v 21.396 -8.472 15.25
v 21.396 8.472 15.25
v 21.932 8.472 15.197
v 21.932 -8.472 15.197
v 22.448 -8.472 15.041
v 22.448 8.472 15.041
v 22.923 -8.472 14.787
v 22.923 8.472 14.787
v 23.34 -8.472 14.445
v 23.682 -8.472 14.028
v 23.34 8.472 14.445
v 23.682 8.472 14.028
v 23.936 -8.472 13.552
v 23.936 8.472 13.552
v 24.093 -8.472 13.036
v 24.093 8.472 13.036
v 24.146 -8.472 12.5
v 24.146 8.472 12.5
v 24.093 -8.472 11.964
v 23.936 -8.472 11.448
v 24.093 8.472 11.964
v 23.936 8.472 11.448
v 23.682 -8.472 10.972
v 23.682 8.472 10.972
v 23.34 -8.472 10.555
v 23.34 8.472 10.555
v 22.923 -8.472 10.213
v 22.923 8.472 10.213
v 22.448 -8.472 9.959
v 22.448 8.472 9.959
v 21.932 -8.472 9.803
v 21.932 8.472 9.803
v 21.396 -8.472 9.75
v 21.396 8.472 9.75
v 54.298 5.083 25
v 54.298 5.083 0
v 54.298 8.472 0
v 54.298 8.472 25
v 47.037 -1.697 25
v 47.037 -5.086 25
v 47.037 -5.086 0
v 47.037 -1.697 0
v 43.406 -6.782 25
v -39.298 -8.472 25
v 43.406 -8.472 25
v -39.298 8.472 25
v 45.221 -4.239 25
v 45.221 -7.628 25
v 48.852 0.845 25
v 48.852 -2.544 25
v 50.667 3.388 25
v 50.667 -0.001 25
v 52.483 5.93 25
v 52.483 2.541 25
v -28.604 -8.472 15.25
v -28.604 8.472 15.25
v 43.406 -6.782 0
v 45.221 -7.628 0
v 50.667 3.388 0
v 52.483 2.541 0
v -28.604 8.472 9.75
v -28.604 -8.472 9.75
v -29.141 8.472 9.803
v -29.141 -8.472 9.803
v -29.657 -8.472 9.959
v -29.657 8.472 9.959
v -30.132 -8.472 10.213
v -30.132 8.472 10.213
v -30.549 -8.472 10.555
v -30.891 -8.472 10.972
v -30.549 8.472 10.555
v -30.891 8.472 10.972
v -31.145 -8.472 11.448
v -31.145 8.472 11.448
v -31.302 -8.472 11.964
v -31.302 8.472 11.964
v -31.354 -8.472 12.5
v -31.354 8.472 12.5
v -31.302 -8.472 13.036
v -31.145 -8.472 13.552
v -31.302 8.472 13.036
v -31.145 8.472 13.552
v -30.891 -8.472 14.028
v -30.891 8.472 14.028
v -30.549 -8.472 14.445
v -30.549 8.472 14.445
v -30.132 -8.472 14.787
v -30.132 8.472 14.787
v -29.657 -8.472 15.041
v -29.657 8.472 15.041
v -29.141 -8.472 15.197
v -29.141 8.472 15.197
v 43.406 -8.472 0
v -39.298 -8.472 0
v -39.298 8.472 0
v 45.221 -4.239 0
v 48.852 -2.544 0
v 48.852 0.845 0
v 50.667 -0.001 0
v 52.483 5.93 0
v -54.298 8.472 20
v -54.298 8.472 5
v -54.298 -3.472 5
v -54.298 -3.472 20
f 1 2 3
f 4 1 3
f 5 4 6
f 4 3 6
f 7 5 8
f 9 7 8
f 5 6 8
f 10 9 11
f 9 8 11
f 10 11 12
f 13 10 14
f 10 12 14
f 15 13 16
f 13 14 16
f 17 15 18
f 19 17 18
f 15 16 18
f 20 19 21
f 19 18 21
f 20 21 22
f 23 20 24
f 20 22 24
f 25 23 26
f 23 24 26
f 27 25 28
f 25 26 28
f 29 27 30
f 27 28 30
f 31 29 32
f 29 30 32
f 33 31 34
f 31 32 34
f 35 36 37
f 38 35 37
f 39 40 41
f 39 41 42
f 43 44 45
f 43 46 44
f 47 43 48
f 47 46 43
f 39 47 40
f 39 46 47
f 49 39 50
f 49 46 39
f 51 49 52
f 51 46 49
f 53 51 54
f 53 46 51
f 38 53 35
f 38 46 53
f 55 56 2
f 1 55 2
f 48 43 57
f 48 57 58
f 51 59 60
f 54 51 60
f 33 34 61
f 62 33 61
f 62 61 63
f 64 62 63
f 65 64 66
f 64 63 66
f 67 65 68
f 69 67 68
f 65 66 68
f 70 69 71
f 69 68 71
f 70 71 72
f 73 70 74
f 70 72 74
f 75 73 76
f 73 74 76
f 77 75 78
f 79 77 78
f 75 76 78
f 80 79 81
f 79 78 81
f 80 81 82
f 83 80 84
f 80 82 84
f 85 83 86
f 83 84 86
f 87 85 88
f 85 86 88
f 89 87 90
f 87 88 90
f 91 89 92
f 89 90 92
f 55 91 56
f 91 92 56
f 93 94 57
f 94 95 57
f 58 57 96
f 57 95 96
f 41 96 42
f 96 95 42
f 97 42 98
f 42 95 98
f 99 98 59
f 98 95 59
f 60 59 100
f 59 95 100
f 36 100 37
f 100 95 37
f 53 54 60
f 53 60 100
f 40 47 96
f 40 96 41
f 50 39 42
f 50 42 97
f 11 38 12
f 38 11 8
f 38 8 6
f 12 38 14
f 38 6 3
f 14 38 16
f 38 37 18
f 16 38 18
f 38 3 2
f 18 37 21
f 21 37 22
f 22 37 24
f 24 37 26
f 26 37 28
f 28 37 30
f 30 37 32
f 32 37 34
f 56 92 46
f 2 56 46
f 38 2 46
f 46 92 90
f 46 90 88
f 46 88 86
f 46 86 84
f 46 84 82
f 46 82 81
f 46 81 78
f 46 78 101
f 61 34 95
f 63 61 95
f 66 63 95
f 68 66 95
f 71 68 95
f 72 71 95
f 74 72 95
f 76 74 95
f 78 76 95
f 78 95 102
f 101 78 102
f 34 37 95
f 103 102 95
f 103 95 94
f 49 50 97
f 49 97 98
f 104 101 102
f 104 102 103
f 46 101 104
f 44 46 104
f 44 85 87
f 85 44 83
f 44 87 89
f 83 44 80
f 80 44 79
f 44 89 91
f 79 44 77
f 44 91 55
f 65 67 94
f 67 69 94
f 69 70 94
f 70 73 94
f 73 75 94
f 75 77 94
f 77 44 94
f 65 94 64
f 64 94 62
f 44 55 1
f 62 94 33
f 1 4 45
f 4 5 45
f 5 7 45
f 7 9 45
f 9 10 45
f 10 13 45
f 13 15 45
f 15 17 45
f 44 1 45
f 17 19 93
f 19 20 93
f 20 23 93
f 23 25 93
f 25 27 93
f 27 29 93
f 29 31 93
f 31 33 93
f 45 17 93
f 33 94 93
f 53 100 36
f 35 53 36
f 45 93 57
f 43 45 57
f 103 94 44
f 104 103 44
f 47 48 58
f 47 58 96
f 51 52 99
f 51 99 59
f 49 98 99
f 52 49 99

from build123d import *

# Parameters (mm, degrees)
F1_DEPTH   = 25
F1_FACE1_W = 97.703975
F1_FACE1_H = 25
F3_DEPTH   = 25
F4_SIZE2   = 15
F4_SIZE    = 5


with BuildPart() as f1:
    # F0 (on Top) → F1 (new body)
    with BuildSketch(Plane.XY):
        Polygon((-54.298416, 8.472222), (-54.298416, -8.472222), (43.405559, -8.472222), (43.405559, -6.781688), (45.221035, -7.628259), (45.221035, -4.23937), (47.036511, -5.08594), (47.036511, -1.697051), (48.851987, -2.543622), (48.851987, 0.845267), (50.667464, -0.001303), (50.667464, 3.387586), (52.48294, 2.541015), (52.48294, 5.929904), (54.298416, 5.083334), (54.298416, 8.472222), align=None)
    extrude(amount=F1_DEPTH)

    # F2 (on face) + F1_face1 (on face) → F3 (cut)
    with BuildSketch(Plane(origin=(0, 8.472222, 0), x_dir=(-1, 0, 0), z_dir=(0, 1, 0))):
        with BuildLine():
            Line((-21.3955357732, 9.75), (28.6044642268, 9.75))
            ThreePointArc((28.6044642268, 9.75), (31.3544642268, 12.5), (28.6044642268, 15.25))
            Line((28.6044642268, 15.25), (-21.3955357732, 15.25))
            ThreePointArc((-21.3955357732, 15.25), (-24.1455357732, 12.5), (-21.3955357732, 9.75))
        make_face()
    with BuildSketch(Plane(origin=(-5.4464285, -8.472222, 12.5), x_dir=(1, 0, 0), z_dir=(0, -1, 0))):
        Rectangle(F1_FACE1_W, F1_FACE1_H)
    extrude(amount=-F3_DEPTH, dir=(0, 1, 0), mode=Mode.SUBTRACT)

    # F4
    f4_edges = [f1.edges().sort_by_distance(p)[0] for p in [
        (-54.298416, 0, 25),
        (-54.298416, 0, 0),
        (-54.298416, -8.472222, 12.5),
    ]]
    f4_side = f1.faces().sort_by_distance((-54.298416, 0, 12.5))[0]
    chamfer(f4_edges, length=F4_SIZE, length2=F4_SIZE2, reference=f4_side)


solid = f1.part
